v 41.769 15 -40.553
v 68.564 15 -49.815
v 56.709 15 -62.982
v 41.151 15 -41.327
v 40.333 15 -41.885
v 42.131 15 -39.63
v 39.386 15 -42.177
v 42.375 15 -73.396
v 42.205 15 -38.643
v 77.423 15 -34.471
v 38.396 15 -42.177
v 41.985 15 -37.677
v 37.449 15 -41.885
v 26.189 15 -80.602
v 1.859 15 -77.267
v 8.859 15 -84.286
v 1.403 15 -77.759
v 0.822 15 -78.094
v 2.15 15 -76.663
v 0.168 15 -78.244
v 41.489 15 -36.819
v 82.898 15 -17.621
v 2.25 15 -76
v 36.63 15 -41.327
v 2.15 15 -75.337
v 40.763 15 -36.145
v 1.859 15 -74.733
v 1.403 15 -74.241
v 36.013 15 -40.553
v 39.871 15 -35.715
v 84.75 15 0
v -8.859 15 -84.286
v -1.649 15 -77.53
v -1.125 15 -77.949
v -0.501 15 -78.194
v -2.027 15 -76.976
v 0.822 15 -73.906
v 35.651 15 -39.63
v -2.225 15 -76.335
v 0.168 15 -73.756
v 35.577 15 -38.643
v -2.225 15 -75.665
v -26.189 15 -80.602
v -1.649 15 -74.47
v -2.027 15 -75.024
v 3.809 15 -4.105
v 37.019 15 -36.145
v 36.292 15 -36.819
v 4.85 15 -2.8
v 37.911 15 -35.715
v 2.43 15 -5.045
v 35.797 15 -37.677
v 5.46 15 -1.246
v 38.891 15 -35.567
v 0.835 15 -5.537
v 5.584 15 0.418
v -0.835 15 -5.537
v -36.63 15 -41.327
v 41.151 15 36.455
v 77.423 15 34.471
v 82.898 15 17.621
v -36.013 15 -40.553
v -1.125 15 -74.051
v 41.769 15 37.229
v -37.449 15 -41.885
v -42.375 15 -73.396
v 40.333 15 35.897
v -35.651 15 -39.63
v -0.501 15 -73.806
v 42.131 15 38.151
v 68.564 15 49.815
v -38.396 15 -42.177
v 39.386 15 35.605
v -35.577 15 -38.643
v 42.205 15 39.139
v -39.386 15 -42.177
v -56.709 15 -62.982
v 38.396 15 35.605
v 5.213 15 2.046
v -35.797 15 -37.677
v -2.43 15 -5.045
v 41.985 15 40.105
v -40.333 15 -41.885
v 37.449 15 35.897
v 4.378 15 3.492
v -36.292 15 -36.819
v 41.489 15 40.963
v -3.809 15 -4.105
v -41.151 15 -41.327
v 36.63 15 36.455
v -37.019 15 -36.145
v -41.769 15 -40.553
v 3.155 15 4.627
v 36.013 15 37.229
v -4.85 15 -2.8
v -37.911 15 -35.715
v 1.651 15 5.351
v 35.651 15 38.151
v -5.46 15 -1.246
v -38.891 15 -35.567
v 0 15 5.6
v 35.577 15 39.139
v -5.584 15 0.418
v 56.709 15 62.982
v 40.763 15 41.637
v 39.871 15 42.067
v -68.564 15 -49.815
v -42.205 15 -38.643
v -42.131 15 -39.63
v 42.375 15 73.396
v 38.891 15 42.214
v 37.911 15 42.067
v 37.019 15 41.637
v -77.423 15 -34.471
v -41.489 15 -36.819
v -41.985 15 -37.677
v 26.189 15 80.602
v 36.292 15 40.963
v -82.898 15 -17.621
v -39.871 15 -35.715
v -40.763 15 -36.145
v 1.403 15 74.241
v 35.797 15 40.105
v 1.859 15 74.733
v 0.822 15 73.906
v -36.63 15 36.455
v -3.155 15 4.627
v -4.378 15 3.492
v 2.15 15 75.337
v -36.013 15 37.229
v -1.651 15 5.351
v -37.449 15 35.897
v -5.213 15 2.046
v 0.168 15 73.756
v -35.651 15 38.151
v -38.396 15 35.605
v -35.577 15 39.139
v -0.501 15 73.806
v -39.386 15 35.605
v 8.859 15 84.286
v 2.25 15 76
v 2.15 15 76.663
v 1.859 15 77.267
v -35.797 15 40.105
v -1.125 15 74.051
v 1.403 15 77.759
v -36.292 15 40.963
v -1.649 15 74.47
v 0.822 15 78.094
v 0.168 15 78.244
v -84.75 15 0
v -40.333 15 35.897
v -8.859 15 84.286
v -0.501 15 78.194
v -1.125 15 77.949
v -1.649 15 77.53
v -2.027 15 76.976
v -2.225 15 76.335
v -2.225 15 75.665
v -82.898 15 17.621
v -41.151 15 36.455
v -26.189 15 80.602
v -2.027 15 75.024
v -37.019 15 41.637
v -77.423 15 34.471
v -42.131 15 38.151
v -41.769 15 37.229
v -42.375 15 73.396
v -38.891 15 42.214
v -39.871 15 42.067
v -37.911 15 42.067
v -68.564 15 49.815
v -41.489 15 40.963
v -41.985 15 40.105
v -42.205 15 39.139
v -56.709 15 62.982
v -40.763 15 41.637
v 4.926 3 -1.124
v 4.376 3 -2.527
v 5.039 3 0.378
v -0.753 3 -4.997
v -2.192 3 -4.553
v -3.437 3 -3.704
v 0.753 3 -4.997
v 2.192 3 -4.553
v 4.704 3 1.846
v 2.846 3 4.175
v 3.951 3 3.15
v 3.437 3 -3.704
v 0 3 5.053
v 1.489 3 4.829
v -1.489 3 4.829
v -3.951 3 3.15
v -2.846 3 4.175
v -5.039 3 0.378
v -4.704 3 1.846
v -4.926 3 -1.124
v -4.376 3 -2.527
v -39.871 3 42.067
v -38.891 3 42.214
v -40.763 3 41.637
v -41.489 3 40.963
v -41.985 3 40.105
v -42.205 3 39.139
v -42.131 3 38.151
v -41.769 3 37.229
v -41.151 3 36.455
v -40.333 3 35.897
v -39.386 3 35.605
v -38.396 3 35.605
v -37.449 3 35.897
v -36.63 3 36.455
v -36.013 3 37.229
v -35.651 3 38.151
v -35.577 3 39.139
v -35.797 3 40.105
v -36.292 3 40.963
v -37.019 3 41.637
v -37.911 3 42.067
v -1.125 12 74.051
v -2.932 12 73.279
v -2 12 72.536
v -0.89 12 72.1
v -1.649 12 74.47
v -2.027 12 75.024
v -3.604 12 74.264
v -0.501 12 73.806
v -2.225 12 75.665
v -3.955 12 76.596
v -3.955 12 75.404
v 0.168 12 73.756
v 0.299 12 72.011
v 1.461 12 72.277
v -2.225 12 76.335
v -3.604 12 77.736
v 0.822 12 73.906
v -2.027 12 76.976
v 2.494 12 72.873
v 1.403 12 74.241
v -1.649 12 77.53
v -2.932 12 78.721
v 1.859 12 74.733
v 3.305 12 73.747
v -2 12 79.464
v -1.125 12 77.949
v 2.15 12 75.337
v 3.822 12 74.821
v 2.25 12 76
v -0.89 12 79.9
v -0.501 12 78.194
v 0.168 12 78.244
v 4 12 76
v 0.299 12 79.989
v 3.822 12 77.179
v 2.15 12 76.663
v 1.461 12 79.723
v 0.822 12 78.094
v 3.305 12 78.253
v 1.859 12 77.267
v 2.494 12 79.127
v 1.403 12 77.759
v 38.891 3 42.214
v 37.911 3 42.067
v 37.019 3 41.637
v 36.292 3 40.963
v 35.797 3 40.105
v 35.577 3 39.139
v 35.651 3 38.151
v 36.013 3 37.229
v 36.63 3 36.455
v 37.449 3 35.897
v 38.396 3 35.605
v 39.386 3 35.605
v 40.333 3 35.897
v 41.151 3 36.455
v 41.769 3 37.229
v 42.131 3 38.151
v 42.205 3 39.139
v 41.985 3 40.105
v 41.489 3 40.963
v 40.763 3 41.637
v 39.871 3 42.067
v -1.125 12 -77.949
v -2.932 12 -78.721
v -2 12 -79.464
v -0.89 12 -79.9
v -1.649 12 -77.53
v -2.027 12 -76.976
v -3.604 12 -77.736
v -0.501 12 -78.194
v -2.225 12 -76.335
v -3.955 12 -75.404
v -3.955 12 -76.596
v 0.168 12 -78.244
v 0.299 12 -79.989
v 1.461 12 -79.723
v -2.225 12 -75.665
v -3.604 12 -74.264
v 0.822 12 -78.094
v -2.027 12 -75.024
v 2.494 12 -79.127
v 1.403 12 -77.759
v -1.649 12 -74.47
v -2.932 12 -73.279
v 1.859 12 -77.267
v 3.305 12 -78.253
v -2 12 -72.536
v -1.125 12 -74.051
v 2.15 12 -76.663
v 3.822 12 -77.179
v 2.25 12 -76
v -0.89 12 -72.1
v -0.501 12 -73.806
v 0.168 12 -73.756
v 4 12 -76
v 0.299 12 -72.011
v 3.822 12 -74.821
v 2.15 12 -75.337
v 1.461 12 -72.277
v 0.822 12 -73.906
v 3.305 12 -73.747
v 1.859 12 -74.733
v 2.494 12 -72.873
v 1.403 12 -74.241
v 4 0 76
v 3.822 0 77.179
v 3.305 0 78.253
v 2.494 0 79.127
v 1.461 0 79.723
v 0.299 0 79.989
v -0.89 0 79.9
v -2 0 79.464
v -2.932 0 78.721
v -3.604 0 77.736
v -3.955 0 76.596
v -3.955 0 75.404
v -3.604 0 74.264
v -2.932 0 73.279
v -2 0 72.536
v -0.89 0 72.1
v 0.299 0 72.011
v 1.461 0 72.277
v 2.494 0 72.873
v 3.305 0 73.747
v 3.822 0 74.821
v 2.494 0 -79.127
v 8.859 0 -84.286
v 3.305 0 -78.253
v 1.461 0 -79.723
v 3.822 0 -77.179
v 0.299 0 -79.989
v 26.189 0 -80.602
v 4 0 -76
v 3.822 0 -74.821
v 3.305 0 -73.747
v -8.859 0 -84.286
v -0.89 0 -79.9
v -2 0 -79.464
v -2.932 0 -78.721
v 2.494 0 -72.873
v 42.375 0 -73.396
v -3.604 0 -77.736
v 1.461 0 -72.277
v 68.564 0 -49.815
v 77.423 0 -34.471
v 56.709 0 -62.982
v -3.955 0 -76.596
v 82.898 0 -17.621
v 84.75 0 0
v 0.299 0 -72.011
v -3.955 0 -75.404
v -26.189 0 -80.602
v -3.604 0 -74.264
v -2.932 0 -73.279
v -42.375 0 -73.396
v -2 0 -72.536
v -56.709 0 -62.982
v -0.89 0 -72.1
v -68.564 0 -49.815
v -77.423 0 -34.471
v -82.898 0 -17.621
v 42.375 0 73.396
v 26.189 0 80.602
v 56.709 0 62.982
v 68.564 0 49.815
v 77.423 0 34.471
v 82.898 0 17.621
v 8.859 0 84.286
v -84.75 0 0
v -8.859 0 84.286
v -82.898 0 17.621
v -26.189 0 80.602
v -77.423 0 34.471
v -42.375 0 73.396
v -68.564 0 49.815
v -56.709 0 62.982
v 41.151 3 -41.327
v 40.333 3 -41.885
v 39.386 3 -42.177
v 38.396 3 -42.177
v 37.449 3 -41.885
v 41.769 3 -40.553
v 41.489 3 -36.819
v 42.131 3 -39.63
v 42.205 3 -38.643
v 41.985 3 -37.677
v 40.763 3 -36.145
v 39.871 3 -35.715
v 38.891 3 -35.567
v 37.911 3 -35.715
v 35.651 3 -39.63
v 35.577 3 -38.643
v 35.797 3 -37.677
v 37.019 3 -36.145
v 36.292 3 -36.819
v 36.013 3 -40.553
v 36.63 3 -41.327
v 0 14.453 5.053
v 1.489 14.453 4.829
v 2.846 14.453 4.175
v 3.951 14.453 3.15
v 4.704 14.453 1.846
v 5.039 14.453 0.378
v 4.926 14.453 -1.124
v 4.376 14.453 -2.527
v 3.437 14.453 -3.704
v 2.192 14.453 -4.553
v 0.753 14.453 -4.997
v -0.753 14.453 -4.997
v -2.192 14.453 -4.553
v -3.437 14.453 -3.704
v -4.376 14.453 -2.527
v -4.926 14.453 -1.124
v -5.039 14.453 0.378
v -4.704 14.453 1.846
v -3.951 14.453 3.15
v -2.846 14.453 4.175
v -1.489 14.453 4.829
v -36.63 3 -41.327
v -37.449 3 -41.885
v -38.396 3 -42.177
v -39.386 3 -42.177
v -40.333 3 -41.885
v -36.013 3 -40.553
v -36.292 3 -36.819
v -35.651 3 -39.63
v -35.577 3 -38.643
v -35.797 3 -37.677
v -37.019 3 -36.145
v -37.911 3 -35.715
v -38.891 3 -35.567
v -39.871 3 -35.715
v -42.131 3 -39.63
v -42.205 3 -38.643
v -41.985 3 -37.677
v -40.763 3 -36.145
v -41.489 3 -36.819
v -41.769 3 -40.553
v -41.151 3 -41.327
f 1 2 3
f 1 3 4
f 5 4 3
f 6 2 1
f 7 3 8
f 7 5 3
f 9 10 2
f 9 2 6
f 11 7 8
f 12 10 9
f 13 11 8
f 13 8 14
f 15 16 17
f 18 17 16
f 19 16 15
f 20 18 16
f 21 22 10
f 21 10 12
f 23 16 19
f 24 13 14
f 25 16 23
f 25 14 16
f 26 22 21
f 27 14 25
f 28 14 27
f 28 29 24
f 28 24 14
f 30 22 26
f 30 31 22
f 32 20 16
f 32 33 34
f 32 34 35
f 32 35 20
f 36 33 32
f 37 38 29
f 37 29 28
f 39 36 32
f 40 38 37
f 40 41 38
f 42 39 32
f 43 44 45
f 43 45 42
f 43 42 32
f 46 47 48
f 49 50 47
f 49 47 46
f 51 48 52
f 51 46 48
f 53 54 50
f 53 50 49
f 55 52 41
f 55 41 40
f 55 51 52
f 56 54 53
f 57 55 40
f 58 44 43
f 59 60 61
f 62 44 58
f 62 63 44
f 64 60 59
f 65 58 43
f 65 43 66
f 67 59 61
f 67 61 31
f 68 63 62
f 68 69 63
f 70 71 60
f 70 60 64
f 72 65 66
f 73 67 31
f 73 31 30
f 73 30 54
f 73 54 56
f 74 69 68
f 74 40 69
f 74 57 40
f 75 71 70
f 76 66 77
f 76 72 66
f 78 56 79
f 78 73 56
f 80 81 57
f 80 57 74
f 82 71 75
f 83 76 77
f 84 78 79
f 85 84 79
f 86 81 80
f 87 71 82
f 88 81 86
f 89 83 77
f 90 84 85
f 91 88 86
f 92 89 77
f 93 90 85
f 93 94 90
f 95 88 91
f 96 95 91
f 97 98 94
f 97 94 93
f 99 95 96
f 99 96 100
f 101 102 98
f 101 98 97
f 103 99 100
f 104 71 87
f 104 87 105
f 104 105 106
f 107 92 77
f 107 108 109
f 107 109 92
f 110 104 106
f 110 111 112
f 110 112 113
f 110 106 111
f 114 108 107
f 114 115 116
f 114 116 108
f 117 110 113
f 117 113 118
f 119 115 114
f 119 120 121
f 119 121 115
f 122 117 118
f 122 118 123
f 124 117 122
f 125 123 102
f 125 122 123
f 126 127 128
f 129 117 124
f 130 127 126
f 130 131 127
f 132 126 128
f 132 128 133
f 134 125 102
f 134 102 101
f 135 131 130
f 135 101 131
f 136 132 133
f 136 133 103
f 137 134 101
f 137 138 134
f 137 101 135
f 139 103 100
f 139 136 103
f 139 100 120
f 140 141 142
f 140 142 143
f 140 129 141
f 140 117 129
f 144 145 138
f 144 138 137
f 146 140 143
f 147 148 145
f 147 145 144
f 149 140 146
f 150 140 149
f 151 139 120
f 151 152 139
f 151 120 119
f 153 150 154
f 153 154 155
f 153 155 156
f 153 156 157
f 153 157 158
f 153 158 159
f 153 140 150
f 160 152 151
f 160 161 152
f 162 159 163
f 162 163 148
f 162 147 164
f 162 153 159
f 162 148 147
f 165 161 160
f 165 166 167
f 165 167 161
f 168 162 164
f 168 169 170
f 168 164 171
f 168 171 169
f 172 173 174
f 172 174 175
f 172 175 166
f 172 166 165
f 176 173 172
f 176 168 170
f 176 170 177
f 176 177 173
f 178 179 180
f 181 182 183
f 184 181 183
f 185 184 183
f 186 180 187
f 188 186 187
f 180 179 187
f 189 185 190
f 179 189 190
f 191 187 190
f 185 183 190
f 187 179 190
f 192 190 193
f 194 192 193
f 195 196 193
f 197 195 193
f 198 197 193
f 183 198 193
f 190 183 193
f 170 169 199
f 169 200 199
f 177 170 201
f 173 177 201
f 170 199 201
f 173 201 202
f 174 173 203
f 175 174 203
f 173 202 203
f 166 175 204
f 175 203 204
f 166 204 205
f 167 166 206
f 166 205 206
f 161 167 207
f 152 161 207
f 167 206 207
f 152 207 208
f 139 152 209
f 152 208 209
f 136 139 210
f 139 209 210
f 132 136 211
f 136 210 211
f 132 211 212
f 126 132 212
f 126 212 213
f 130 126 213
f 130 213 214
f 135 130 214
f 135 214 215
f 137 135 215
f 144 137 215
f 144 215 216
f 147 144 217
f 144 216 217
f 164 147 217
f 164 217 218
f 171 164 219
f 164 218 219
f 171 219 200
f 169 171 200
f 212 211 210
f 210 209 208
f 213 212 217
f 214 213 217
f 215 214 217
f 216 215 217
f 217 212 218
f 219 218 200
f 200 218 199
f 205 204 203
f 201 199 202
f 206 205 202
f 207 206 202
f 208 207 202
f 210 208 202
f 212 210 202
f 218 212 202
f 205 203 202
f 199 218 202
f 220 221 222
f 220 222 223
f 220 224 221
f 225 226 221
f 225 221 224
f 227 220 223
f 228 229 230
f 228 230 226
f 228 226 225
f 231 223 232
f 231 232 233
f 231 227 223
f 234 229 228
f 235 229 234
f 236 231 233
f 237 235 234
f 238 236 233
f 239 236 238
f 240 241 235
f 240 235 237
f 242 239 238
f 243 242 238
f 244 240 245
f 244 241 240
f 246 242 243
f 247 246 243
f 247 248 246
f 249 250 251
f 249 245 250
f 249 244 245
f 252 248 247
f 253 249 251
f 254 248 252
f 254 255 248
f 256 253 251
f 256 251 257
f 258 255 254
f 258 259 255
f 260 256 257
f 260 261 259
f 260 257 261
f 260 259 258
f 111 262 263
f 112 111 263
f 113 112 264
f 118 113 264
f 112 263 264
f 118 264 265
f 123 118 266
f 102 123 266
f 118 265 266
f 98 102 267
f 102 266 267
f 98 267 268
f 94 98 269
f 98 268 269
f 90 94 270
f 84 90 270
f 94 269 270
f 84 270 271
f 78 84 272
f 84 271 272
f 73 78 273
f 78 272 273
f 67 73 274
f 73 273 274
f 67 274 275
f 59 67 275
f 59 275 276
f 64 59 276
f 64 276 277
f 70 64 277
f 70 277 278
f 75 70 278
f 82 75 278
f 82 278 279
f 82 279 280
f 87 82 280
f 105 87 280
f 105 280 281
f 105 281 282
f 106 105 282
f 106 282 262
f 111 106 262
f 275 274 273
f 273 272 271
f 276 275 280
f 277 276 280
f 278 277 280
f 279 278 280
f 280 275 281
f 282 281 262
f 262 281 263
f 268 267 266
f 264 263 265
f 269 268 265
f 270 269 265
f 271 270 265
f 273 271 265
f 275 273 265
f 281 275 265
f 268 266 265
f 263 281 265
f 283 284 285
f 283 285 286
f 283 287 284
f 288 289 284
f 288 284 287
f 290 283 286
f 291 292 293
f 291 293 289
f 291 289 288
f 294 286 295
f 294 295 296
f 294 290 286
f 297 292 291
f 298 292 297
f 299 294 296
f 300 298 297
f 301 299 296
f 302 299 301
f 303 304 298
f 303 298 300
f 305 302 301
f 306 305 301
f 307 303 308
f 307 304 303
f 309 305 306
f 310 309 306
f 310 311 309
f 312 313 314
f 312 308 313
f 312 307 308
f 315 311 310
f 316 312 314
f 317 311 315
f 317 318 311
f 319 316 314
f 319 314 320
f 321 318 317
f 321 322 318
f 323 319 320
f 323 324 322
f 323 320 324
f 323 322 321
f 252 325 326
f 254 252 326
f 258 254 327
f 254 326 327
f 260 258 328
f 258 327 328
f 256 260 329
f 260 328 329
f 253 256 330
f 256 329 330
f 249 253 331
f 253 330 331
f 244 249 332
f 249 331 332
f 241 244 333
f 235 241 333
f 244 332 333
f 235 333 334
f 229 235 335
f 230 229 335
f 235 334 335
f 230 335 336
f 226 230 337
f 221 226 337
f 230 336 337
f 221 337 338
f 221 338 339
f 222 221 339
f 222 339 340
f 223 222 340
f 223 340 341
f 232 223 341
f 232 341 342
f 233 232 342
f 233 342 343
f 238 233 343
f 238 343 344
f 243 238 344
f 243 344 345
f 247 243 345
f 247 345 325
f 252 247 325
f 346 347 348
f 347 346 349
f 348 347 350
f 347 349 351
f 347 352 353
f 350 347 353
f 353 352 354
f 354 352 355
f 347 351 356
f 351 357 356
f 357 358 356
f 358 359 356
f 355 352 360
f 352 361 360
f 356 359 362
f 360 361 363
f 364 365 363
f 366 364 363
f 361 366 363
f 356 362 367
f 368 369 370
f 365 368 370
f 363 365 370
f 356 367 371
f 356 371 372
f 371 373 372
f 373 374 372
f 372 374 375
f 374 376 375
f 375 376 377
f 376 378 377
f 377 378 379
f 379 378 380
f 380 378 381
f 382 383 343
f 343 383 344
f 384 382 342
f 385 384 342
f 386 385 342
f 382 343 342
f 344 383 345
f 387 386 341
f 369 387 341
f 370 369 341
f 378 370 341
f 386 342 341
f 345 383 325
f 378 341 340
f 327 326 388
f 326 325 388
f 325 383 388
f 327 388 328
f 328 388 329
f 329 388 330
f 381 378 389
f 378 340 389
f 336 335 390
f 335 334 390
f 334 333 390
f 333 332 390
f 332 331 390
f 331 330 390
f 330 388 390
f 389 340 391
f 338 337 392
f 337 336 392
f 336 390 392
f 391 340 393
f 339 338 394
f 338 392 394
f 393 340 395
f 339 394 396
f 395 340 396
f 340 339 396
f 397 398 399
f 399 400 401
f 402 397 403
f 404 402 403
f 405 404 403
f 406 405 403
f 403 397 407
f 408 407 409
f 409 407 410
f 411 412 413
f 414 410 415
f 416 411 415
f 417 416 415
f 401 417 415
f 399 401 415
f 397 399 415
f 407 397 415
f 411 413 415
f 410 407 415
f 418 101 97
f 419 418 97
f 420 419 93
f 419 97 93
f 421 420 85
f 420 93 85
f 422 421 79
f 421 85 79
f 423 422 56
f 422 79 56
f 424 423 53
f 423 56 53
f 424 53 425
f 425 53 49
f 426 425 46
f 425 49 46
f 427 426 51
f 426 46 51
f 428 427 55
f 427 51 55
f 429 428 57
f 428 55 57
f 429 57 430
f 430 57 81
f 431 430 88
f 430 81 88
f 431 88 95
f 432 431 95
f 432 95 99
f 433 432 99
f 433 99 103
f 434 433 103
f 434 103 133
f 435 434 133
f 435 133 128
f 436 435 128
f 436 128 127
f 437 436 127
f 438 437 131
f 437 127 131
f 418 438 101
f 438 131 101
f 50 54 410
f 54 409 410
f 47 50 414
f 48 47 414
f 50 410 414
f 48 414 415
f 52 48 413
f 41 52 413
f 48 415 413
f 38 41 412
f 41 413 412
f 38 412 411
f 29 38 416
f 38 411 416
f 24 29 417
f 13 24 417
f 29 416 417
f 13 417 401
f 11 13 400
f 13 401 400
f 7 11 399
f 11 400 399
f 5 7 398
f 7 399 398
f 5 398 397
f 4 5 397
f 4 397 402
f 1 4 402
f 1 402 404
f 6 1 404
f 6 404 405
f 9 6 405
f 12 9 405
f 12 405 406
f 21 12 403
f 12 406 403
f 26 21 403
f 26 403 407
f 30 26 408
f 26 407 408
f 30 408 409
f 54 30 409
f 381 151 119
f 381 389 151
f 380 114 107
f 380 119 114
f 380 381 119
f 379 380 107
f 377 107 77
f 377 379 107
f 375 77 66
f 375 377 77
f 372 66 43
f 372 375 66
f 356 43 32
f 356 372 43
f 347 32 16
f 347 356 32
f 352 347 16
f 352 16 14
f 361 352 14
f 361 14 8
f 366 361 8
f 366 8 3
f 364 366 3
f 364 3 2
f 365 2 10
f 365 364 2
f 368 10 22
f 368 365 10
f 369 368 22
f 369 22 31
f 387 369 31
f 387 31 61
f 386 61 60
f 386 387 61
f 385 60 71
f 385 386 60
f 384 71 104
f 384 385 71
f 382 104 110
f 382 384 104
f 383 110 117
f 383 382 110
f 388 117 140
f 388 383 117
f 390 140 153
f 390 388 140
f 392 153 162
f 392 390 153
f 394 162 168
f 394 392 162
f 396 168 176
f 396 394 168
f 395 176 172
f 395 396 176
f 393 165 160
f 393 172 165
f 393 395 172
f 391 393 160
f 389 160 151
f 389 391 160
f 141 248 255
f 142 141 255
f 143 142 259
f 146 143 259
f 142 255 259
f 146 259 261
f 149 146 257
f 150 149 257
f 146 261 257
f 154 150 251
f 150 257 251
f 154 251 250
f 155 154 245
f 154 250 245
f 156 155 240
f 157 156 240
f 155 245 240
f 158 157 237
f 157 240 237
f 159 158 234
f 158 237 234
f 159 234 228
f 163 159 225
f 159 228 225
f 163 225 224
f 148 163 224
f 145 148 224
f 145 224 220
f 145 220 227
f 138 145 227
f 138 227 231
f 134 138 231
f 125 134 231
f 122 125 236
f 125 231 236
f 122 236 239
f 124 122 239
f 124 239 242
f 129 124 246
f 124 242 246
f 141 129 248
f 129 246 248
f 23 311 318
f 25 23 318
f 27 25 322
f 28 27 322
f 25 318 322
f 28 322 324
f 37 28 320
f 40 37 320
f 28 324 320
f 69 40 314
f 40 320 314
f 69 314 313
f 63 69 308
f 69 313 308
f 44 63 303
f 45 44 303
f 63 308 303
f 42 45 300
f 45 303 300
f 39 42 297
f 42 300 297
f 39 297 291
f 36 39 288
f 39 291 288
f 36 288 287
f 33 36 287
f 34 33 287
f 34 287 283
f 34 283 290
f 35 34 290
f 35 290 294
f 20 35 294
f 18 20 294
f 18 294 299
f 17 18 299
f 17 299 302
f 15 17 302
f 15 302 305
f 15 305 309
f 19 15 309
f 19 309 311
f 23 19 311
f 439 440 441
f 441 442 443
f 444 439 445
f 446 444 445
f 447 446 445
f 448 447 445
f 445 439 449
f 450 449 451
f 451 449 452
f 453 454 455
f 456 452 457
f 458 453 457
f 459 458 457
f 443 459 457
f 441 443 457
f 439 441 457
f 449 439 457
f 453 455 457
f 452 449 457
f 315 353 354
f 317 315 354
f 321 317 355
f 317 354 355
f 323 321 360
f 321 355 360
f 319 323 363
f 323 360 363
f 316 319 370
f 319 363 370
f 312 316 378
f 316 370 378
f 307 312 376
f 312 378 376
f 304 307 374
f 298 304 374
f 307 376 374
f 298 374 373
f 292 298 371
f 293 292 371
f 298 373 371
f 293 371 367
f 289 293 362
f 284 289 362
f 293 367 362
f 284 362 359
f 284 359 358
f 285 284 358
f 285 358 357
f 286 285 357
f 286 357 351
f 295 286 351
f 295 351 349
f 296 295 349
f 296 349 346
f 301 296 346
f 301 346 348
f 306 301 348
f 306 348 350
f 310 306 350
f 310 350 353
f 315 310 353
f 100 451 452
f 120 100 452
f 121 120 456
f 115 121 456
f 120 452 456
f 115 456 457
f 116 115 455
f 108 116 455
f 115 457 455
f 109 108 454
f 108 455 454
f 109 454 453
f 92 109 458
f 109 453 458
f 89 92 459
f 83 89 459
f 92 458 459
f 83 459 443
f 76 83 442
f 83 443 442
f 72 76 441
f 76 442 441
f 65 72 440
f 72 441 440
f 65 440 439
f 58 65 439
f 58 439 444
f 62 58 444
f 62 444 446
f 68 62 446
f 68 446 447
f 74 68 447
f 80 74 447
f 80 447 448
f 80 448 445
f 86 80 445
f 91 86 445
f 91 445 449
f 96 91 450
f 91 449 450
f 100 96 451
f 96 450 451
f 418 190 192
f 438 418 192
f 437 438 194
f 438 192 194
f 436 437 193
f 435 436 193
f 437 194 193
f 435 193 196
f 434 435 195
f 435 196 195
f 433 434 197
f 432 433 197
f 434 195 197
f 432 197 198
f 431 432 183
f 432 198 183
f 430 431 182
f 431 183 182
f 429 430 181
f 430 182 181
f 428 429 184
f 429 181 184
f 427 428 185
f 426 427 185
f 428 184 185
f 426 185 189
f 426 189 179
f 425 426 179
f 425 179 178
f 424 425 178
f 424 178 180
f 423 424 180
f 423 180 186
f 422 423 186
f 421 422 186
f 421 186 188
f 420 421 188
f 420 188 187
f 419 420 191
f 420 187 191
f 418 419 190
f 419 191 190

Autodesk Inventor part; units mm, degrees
ref_plane "YZ Plane" through (0, 0, 0) normal (1, 0, 0) x (0, 1, 0)
ref_plane "XZ Plane" through (0, 0, 0) normal (0, 1, 0) x (-1, 0, 0)
ref_plane "XY Plane" through (0, 0, 0) normal (0, 0, 1) x (1, 0, 0)
sketch "Sketch1" plane through (0, 0, 0) normal (0, 1, 0) x (-1, 0, 0)
  circle A0 centre (0, 0) radius 84.75
  dimension "d0" = 169.5
extrude "Extrusion1" add sketch "Sketch1" along normal blind 15
sketch "Sketch2" plane through (0, 0, 0) normal (0, -1, 0) x (1, 0, 0)
  circle A0 centre (0, 0) radius 76
  circle A1 centre (0, 76) radius 4
  circle A2 centre (0, -76) radius 4
  circle A3 centre (0, 76) radius 2.25
  circle A4 centre (0, -76) radius 2.25
  dimension "d3" = 152
  dimension "d4" = 8
  dimension "d5" = 8
  dimension "d6" = 4.5
  dimension "d7" = 4.5
extrude "Extrusion2" cut sketch "Sketch2" against normal through all contours A3 A0 | A0 A3 | A4 A0 | A0 A4
extrude "Extrusion3" cut sketch "Sketch2" against normal blind 12 contours A1 A0 A3 | A0 A3 A1 | A2 A0 A4 | A0 A4 A2 | A3 A0 | A0 A3 | A4 A0 | A0 A4
sketch "Sketch3" plane through (0, 15, 0) normal (0, 1, 0) x (1, 0, 0)
  circle A0 centre (0, 0) radius 84.75
hole "Hole1" at (0, 15, 0) direction (0, -1, 0) diameter 10.106 depth 12 countersink diameter 11.2 countersink angle 90 thread size "M12x1.75" class "6H" standard "ISO Metric profile"
sketch "Sketch4" plane through (0, 15, 0) normal (0, 1, 0) x (1, 0, 0)
  circle A0 centre (0, 0) radius 5.053 projected
  circle A1 centre (0, 0) radius 55
  line L0 (-55, -55) -> (55, -55)
  line L1 (55, -55) -> (55, 55)
  line L2 (55, 55) -> (-55, 55)
  line L3 (-55, 55) -> (-55, -55)
  line L4 (-55, -55) -> (55, 55) construction
  line L5 (55, -55) -> (-55, 55) construction
  circle A2 centre (-38.8909, -38.8909) radius 4
  circle A3 centre (-38.8909, 38.8909) radius 4
  circle A4 centre (38.8909, -38.8909) radius 4
  circle A5 centre (38.8909, 38.8909) radius 4
  dimension "d19" = 110
  dimension "d20" = 8
  dimension "d21" = 8
  dimension "d22" = 8
  dimension "d23" = 8
hole "Hole2" at (-38.8909, 15, 38.8909) at (-38.8909, 15, -38.8909) at (38.8909, 15, -38.8909) at (38.8909, 15, 38.8909) direction (0, -1, 0) diameter 6.647 depth 12 thread size "M8x1.25" class "6H" standard "ISO Metric profile"
properties part number "substrate plate"
